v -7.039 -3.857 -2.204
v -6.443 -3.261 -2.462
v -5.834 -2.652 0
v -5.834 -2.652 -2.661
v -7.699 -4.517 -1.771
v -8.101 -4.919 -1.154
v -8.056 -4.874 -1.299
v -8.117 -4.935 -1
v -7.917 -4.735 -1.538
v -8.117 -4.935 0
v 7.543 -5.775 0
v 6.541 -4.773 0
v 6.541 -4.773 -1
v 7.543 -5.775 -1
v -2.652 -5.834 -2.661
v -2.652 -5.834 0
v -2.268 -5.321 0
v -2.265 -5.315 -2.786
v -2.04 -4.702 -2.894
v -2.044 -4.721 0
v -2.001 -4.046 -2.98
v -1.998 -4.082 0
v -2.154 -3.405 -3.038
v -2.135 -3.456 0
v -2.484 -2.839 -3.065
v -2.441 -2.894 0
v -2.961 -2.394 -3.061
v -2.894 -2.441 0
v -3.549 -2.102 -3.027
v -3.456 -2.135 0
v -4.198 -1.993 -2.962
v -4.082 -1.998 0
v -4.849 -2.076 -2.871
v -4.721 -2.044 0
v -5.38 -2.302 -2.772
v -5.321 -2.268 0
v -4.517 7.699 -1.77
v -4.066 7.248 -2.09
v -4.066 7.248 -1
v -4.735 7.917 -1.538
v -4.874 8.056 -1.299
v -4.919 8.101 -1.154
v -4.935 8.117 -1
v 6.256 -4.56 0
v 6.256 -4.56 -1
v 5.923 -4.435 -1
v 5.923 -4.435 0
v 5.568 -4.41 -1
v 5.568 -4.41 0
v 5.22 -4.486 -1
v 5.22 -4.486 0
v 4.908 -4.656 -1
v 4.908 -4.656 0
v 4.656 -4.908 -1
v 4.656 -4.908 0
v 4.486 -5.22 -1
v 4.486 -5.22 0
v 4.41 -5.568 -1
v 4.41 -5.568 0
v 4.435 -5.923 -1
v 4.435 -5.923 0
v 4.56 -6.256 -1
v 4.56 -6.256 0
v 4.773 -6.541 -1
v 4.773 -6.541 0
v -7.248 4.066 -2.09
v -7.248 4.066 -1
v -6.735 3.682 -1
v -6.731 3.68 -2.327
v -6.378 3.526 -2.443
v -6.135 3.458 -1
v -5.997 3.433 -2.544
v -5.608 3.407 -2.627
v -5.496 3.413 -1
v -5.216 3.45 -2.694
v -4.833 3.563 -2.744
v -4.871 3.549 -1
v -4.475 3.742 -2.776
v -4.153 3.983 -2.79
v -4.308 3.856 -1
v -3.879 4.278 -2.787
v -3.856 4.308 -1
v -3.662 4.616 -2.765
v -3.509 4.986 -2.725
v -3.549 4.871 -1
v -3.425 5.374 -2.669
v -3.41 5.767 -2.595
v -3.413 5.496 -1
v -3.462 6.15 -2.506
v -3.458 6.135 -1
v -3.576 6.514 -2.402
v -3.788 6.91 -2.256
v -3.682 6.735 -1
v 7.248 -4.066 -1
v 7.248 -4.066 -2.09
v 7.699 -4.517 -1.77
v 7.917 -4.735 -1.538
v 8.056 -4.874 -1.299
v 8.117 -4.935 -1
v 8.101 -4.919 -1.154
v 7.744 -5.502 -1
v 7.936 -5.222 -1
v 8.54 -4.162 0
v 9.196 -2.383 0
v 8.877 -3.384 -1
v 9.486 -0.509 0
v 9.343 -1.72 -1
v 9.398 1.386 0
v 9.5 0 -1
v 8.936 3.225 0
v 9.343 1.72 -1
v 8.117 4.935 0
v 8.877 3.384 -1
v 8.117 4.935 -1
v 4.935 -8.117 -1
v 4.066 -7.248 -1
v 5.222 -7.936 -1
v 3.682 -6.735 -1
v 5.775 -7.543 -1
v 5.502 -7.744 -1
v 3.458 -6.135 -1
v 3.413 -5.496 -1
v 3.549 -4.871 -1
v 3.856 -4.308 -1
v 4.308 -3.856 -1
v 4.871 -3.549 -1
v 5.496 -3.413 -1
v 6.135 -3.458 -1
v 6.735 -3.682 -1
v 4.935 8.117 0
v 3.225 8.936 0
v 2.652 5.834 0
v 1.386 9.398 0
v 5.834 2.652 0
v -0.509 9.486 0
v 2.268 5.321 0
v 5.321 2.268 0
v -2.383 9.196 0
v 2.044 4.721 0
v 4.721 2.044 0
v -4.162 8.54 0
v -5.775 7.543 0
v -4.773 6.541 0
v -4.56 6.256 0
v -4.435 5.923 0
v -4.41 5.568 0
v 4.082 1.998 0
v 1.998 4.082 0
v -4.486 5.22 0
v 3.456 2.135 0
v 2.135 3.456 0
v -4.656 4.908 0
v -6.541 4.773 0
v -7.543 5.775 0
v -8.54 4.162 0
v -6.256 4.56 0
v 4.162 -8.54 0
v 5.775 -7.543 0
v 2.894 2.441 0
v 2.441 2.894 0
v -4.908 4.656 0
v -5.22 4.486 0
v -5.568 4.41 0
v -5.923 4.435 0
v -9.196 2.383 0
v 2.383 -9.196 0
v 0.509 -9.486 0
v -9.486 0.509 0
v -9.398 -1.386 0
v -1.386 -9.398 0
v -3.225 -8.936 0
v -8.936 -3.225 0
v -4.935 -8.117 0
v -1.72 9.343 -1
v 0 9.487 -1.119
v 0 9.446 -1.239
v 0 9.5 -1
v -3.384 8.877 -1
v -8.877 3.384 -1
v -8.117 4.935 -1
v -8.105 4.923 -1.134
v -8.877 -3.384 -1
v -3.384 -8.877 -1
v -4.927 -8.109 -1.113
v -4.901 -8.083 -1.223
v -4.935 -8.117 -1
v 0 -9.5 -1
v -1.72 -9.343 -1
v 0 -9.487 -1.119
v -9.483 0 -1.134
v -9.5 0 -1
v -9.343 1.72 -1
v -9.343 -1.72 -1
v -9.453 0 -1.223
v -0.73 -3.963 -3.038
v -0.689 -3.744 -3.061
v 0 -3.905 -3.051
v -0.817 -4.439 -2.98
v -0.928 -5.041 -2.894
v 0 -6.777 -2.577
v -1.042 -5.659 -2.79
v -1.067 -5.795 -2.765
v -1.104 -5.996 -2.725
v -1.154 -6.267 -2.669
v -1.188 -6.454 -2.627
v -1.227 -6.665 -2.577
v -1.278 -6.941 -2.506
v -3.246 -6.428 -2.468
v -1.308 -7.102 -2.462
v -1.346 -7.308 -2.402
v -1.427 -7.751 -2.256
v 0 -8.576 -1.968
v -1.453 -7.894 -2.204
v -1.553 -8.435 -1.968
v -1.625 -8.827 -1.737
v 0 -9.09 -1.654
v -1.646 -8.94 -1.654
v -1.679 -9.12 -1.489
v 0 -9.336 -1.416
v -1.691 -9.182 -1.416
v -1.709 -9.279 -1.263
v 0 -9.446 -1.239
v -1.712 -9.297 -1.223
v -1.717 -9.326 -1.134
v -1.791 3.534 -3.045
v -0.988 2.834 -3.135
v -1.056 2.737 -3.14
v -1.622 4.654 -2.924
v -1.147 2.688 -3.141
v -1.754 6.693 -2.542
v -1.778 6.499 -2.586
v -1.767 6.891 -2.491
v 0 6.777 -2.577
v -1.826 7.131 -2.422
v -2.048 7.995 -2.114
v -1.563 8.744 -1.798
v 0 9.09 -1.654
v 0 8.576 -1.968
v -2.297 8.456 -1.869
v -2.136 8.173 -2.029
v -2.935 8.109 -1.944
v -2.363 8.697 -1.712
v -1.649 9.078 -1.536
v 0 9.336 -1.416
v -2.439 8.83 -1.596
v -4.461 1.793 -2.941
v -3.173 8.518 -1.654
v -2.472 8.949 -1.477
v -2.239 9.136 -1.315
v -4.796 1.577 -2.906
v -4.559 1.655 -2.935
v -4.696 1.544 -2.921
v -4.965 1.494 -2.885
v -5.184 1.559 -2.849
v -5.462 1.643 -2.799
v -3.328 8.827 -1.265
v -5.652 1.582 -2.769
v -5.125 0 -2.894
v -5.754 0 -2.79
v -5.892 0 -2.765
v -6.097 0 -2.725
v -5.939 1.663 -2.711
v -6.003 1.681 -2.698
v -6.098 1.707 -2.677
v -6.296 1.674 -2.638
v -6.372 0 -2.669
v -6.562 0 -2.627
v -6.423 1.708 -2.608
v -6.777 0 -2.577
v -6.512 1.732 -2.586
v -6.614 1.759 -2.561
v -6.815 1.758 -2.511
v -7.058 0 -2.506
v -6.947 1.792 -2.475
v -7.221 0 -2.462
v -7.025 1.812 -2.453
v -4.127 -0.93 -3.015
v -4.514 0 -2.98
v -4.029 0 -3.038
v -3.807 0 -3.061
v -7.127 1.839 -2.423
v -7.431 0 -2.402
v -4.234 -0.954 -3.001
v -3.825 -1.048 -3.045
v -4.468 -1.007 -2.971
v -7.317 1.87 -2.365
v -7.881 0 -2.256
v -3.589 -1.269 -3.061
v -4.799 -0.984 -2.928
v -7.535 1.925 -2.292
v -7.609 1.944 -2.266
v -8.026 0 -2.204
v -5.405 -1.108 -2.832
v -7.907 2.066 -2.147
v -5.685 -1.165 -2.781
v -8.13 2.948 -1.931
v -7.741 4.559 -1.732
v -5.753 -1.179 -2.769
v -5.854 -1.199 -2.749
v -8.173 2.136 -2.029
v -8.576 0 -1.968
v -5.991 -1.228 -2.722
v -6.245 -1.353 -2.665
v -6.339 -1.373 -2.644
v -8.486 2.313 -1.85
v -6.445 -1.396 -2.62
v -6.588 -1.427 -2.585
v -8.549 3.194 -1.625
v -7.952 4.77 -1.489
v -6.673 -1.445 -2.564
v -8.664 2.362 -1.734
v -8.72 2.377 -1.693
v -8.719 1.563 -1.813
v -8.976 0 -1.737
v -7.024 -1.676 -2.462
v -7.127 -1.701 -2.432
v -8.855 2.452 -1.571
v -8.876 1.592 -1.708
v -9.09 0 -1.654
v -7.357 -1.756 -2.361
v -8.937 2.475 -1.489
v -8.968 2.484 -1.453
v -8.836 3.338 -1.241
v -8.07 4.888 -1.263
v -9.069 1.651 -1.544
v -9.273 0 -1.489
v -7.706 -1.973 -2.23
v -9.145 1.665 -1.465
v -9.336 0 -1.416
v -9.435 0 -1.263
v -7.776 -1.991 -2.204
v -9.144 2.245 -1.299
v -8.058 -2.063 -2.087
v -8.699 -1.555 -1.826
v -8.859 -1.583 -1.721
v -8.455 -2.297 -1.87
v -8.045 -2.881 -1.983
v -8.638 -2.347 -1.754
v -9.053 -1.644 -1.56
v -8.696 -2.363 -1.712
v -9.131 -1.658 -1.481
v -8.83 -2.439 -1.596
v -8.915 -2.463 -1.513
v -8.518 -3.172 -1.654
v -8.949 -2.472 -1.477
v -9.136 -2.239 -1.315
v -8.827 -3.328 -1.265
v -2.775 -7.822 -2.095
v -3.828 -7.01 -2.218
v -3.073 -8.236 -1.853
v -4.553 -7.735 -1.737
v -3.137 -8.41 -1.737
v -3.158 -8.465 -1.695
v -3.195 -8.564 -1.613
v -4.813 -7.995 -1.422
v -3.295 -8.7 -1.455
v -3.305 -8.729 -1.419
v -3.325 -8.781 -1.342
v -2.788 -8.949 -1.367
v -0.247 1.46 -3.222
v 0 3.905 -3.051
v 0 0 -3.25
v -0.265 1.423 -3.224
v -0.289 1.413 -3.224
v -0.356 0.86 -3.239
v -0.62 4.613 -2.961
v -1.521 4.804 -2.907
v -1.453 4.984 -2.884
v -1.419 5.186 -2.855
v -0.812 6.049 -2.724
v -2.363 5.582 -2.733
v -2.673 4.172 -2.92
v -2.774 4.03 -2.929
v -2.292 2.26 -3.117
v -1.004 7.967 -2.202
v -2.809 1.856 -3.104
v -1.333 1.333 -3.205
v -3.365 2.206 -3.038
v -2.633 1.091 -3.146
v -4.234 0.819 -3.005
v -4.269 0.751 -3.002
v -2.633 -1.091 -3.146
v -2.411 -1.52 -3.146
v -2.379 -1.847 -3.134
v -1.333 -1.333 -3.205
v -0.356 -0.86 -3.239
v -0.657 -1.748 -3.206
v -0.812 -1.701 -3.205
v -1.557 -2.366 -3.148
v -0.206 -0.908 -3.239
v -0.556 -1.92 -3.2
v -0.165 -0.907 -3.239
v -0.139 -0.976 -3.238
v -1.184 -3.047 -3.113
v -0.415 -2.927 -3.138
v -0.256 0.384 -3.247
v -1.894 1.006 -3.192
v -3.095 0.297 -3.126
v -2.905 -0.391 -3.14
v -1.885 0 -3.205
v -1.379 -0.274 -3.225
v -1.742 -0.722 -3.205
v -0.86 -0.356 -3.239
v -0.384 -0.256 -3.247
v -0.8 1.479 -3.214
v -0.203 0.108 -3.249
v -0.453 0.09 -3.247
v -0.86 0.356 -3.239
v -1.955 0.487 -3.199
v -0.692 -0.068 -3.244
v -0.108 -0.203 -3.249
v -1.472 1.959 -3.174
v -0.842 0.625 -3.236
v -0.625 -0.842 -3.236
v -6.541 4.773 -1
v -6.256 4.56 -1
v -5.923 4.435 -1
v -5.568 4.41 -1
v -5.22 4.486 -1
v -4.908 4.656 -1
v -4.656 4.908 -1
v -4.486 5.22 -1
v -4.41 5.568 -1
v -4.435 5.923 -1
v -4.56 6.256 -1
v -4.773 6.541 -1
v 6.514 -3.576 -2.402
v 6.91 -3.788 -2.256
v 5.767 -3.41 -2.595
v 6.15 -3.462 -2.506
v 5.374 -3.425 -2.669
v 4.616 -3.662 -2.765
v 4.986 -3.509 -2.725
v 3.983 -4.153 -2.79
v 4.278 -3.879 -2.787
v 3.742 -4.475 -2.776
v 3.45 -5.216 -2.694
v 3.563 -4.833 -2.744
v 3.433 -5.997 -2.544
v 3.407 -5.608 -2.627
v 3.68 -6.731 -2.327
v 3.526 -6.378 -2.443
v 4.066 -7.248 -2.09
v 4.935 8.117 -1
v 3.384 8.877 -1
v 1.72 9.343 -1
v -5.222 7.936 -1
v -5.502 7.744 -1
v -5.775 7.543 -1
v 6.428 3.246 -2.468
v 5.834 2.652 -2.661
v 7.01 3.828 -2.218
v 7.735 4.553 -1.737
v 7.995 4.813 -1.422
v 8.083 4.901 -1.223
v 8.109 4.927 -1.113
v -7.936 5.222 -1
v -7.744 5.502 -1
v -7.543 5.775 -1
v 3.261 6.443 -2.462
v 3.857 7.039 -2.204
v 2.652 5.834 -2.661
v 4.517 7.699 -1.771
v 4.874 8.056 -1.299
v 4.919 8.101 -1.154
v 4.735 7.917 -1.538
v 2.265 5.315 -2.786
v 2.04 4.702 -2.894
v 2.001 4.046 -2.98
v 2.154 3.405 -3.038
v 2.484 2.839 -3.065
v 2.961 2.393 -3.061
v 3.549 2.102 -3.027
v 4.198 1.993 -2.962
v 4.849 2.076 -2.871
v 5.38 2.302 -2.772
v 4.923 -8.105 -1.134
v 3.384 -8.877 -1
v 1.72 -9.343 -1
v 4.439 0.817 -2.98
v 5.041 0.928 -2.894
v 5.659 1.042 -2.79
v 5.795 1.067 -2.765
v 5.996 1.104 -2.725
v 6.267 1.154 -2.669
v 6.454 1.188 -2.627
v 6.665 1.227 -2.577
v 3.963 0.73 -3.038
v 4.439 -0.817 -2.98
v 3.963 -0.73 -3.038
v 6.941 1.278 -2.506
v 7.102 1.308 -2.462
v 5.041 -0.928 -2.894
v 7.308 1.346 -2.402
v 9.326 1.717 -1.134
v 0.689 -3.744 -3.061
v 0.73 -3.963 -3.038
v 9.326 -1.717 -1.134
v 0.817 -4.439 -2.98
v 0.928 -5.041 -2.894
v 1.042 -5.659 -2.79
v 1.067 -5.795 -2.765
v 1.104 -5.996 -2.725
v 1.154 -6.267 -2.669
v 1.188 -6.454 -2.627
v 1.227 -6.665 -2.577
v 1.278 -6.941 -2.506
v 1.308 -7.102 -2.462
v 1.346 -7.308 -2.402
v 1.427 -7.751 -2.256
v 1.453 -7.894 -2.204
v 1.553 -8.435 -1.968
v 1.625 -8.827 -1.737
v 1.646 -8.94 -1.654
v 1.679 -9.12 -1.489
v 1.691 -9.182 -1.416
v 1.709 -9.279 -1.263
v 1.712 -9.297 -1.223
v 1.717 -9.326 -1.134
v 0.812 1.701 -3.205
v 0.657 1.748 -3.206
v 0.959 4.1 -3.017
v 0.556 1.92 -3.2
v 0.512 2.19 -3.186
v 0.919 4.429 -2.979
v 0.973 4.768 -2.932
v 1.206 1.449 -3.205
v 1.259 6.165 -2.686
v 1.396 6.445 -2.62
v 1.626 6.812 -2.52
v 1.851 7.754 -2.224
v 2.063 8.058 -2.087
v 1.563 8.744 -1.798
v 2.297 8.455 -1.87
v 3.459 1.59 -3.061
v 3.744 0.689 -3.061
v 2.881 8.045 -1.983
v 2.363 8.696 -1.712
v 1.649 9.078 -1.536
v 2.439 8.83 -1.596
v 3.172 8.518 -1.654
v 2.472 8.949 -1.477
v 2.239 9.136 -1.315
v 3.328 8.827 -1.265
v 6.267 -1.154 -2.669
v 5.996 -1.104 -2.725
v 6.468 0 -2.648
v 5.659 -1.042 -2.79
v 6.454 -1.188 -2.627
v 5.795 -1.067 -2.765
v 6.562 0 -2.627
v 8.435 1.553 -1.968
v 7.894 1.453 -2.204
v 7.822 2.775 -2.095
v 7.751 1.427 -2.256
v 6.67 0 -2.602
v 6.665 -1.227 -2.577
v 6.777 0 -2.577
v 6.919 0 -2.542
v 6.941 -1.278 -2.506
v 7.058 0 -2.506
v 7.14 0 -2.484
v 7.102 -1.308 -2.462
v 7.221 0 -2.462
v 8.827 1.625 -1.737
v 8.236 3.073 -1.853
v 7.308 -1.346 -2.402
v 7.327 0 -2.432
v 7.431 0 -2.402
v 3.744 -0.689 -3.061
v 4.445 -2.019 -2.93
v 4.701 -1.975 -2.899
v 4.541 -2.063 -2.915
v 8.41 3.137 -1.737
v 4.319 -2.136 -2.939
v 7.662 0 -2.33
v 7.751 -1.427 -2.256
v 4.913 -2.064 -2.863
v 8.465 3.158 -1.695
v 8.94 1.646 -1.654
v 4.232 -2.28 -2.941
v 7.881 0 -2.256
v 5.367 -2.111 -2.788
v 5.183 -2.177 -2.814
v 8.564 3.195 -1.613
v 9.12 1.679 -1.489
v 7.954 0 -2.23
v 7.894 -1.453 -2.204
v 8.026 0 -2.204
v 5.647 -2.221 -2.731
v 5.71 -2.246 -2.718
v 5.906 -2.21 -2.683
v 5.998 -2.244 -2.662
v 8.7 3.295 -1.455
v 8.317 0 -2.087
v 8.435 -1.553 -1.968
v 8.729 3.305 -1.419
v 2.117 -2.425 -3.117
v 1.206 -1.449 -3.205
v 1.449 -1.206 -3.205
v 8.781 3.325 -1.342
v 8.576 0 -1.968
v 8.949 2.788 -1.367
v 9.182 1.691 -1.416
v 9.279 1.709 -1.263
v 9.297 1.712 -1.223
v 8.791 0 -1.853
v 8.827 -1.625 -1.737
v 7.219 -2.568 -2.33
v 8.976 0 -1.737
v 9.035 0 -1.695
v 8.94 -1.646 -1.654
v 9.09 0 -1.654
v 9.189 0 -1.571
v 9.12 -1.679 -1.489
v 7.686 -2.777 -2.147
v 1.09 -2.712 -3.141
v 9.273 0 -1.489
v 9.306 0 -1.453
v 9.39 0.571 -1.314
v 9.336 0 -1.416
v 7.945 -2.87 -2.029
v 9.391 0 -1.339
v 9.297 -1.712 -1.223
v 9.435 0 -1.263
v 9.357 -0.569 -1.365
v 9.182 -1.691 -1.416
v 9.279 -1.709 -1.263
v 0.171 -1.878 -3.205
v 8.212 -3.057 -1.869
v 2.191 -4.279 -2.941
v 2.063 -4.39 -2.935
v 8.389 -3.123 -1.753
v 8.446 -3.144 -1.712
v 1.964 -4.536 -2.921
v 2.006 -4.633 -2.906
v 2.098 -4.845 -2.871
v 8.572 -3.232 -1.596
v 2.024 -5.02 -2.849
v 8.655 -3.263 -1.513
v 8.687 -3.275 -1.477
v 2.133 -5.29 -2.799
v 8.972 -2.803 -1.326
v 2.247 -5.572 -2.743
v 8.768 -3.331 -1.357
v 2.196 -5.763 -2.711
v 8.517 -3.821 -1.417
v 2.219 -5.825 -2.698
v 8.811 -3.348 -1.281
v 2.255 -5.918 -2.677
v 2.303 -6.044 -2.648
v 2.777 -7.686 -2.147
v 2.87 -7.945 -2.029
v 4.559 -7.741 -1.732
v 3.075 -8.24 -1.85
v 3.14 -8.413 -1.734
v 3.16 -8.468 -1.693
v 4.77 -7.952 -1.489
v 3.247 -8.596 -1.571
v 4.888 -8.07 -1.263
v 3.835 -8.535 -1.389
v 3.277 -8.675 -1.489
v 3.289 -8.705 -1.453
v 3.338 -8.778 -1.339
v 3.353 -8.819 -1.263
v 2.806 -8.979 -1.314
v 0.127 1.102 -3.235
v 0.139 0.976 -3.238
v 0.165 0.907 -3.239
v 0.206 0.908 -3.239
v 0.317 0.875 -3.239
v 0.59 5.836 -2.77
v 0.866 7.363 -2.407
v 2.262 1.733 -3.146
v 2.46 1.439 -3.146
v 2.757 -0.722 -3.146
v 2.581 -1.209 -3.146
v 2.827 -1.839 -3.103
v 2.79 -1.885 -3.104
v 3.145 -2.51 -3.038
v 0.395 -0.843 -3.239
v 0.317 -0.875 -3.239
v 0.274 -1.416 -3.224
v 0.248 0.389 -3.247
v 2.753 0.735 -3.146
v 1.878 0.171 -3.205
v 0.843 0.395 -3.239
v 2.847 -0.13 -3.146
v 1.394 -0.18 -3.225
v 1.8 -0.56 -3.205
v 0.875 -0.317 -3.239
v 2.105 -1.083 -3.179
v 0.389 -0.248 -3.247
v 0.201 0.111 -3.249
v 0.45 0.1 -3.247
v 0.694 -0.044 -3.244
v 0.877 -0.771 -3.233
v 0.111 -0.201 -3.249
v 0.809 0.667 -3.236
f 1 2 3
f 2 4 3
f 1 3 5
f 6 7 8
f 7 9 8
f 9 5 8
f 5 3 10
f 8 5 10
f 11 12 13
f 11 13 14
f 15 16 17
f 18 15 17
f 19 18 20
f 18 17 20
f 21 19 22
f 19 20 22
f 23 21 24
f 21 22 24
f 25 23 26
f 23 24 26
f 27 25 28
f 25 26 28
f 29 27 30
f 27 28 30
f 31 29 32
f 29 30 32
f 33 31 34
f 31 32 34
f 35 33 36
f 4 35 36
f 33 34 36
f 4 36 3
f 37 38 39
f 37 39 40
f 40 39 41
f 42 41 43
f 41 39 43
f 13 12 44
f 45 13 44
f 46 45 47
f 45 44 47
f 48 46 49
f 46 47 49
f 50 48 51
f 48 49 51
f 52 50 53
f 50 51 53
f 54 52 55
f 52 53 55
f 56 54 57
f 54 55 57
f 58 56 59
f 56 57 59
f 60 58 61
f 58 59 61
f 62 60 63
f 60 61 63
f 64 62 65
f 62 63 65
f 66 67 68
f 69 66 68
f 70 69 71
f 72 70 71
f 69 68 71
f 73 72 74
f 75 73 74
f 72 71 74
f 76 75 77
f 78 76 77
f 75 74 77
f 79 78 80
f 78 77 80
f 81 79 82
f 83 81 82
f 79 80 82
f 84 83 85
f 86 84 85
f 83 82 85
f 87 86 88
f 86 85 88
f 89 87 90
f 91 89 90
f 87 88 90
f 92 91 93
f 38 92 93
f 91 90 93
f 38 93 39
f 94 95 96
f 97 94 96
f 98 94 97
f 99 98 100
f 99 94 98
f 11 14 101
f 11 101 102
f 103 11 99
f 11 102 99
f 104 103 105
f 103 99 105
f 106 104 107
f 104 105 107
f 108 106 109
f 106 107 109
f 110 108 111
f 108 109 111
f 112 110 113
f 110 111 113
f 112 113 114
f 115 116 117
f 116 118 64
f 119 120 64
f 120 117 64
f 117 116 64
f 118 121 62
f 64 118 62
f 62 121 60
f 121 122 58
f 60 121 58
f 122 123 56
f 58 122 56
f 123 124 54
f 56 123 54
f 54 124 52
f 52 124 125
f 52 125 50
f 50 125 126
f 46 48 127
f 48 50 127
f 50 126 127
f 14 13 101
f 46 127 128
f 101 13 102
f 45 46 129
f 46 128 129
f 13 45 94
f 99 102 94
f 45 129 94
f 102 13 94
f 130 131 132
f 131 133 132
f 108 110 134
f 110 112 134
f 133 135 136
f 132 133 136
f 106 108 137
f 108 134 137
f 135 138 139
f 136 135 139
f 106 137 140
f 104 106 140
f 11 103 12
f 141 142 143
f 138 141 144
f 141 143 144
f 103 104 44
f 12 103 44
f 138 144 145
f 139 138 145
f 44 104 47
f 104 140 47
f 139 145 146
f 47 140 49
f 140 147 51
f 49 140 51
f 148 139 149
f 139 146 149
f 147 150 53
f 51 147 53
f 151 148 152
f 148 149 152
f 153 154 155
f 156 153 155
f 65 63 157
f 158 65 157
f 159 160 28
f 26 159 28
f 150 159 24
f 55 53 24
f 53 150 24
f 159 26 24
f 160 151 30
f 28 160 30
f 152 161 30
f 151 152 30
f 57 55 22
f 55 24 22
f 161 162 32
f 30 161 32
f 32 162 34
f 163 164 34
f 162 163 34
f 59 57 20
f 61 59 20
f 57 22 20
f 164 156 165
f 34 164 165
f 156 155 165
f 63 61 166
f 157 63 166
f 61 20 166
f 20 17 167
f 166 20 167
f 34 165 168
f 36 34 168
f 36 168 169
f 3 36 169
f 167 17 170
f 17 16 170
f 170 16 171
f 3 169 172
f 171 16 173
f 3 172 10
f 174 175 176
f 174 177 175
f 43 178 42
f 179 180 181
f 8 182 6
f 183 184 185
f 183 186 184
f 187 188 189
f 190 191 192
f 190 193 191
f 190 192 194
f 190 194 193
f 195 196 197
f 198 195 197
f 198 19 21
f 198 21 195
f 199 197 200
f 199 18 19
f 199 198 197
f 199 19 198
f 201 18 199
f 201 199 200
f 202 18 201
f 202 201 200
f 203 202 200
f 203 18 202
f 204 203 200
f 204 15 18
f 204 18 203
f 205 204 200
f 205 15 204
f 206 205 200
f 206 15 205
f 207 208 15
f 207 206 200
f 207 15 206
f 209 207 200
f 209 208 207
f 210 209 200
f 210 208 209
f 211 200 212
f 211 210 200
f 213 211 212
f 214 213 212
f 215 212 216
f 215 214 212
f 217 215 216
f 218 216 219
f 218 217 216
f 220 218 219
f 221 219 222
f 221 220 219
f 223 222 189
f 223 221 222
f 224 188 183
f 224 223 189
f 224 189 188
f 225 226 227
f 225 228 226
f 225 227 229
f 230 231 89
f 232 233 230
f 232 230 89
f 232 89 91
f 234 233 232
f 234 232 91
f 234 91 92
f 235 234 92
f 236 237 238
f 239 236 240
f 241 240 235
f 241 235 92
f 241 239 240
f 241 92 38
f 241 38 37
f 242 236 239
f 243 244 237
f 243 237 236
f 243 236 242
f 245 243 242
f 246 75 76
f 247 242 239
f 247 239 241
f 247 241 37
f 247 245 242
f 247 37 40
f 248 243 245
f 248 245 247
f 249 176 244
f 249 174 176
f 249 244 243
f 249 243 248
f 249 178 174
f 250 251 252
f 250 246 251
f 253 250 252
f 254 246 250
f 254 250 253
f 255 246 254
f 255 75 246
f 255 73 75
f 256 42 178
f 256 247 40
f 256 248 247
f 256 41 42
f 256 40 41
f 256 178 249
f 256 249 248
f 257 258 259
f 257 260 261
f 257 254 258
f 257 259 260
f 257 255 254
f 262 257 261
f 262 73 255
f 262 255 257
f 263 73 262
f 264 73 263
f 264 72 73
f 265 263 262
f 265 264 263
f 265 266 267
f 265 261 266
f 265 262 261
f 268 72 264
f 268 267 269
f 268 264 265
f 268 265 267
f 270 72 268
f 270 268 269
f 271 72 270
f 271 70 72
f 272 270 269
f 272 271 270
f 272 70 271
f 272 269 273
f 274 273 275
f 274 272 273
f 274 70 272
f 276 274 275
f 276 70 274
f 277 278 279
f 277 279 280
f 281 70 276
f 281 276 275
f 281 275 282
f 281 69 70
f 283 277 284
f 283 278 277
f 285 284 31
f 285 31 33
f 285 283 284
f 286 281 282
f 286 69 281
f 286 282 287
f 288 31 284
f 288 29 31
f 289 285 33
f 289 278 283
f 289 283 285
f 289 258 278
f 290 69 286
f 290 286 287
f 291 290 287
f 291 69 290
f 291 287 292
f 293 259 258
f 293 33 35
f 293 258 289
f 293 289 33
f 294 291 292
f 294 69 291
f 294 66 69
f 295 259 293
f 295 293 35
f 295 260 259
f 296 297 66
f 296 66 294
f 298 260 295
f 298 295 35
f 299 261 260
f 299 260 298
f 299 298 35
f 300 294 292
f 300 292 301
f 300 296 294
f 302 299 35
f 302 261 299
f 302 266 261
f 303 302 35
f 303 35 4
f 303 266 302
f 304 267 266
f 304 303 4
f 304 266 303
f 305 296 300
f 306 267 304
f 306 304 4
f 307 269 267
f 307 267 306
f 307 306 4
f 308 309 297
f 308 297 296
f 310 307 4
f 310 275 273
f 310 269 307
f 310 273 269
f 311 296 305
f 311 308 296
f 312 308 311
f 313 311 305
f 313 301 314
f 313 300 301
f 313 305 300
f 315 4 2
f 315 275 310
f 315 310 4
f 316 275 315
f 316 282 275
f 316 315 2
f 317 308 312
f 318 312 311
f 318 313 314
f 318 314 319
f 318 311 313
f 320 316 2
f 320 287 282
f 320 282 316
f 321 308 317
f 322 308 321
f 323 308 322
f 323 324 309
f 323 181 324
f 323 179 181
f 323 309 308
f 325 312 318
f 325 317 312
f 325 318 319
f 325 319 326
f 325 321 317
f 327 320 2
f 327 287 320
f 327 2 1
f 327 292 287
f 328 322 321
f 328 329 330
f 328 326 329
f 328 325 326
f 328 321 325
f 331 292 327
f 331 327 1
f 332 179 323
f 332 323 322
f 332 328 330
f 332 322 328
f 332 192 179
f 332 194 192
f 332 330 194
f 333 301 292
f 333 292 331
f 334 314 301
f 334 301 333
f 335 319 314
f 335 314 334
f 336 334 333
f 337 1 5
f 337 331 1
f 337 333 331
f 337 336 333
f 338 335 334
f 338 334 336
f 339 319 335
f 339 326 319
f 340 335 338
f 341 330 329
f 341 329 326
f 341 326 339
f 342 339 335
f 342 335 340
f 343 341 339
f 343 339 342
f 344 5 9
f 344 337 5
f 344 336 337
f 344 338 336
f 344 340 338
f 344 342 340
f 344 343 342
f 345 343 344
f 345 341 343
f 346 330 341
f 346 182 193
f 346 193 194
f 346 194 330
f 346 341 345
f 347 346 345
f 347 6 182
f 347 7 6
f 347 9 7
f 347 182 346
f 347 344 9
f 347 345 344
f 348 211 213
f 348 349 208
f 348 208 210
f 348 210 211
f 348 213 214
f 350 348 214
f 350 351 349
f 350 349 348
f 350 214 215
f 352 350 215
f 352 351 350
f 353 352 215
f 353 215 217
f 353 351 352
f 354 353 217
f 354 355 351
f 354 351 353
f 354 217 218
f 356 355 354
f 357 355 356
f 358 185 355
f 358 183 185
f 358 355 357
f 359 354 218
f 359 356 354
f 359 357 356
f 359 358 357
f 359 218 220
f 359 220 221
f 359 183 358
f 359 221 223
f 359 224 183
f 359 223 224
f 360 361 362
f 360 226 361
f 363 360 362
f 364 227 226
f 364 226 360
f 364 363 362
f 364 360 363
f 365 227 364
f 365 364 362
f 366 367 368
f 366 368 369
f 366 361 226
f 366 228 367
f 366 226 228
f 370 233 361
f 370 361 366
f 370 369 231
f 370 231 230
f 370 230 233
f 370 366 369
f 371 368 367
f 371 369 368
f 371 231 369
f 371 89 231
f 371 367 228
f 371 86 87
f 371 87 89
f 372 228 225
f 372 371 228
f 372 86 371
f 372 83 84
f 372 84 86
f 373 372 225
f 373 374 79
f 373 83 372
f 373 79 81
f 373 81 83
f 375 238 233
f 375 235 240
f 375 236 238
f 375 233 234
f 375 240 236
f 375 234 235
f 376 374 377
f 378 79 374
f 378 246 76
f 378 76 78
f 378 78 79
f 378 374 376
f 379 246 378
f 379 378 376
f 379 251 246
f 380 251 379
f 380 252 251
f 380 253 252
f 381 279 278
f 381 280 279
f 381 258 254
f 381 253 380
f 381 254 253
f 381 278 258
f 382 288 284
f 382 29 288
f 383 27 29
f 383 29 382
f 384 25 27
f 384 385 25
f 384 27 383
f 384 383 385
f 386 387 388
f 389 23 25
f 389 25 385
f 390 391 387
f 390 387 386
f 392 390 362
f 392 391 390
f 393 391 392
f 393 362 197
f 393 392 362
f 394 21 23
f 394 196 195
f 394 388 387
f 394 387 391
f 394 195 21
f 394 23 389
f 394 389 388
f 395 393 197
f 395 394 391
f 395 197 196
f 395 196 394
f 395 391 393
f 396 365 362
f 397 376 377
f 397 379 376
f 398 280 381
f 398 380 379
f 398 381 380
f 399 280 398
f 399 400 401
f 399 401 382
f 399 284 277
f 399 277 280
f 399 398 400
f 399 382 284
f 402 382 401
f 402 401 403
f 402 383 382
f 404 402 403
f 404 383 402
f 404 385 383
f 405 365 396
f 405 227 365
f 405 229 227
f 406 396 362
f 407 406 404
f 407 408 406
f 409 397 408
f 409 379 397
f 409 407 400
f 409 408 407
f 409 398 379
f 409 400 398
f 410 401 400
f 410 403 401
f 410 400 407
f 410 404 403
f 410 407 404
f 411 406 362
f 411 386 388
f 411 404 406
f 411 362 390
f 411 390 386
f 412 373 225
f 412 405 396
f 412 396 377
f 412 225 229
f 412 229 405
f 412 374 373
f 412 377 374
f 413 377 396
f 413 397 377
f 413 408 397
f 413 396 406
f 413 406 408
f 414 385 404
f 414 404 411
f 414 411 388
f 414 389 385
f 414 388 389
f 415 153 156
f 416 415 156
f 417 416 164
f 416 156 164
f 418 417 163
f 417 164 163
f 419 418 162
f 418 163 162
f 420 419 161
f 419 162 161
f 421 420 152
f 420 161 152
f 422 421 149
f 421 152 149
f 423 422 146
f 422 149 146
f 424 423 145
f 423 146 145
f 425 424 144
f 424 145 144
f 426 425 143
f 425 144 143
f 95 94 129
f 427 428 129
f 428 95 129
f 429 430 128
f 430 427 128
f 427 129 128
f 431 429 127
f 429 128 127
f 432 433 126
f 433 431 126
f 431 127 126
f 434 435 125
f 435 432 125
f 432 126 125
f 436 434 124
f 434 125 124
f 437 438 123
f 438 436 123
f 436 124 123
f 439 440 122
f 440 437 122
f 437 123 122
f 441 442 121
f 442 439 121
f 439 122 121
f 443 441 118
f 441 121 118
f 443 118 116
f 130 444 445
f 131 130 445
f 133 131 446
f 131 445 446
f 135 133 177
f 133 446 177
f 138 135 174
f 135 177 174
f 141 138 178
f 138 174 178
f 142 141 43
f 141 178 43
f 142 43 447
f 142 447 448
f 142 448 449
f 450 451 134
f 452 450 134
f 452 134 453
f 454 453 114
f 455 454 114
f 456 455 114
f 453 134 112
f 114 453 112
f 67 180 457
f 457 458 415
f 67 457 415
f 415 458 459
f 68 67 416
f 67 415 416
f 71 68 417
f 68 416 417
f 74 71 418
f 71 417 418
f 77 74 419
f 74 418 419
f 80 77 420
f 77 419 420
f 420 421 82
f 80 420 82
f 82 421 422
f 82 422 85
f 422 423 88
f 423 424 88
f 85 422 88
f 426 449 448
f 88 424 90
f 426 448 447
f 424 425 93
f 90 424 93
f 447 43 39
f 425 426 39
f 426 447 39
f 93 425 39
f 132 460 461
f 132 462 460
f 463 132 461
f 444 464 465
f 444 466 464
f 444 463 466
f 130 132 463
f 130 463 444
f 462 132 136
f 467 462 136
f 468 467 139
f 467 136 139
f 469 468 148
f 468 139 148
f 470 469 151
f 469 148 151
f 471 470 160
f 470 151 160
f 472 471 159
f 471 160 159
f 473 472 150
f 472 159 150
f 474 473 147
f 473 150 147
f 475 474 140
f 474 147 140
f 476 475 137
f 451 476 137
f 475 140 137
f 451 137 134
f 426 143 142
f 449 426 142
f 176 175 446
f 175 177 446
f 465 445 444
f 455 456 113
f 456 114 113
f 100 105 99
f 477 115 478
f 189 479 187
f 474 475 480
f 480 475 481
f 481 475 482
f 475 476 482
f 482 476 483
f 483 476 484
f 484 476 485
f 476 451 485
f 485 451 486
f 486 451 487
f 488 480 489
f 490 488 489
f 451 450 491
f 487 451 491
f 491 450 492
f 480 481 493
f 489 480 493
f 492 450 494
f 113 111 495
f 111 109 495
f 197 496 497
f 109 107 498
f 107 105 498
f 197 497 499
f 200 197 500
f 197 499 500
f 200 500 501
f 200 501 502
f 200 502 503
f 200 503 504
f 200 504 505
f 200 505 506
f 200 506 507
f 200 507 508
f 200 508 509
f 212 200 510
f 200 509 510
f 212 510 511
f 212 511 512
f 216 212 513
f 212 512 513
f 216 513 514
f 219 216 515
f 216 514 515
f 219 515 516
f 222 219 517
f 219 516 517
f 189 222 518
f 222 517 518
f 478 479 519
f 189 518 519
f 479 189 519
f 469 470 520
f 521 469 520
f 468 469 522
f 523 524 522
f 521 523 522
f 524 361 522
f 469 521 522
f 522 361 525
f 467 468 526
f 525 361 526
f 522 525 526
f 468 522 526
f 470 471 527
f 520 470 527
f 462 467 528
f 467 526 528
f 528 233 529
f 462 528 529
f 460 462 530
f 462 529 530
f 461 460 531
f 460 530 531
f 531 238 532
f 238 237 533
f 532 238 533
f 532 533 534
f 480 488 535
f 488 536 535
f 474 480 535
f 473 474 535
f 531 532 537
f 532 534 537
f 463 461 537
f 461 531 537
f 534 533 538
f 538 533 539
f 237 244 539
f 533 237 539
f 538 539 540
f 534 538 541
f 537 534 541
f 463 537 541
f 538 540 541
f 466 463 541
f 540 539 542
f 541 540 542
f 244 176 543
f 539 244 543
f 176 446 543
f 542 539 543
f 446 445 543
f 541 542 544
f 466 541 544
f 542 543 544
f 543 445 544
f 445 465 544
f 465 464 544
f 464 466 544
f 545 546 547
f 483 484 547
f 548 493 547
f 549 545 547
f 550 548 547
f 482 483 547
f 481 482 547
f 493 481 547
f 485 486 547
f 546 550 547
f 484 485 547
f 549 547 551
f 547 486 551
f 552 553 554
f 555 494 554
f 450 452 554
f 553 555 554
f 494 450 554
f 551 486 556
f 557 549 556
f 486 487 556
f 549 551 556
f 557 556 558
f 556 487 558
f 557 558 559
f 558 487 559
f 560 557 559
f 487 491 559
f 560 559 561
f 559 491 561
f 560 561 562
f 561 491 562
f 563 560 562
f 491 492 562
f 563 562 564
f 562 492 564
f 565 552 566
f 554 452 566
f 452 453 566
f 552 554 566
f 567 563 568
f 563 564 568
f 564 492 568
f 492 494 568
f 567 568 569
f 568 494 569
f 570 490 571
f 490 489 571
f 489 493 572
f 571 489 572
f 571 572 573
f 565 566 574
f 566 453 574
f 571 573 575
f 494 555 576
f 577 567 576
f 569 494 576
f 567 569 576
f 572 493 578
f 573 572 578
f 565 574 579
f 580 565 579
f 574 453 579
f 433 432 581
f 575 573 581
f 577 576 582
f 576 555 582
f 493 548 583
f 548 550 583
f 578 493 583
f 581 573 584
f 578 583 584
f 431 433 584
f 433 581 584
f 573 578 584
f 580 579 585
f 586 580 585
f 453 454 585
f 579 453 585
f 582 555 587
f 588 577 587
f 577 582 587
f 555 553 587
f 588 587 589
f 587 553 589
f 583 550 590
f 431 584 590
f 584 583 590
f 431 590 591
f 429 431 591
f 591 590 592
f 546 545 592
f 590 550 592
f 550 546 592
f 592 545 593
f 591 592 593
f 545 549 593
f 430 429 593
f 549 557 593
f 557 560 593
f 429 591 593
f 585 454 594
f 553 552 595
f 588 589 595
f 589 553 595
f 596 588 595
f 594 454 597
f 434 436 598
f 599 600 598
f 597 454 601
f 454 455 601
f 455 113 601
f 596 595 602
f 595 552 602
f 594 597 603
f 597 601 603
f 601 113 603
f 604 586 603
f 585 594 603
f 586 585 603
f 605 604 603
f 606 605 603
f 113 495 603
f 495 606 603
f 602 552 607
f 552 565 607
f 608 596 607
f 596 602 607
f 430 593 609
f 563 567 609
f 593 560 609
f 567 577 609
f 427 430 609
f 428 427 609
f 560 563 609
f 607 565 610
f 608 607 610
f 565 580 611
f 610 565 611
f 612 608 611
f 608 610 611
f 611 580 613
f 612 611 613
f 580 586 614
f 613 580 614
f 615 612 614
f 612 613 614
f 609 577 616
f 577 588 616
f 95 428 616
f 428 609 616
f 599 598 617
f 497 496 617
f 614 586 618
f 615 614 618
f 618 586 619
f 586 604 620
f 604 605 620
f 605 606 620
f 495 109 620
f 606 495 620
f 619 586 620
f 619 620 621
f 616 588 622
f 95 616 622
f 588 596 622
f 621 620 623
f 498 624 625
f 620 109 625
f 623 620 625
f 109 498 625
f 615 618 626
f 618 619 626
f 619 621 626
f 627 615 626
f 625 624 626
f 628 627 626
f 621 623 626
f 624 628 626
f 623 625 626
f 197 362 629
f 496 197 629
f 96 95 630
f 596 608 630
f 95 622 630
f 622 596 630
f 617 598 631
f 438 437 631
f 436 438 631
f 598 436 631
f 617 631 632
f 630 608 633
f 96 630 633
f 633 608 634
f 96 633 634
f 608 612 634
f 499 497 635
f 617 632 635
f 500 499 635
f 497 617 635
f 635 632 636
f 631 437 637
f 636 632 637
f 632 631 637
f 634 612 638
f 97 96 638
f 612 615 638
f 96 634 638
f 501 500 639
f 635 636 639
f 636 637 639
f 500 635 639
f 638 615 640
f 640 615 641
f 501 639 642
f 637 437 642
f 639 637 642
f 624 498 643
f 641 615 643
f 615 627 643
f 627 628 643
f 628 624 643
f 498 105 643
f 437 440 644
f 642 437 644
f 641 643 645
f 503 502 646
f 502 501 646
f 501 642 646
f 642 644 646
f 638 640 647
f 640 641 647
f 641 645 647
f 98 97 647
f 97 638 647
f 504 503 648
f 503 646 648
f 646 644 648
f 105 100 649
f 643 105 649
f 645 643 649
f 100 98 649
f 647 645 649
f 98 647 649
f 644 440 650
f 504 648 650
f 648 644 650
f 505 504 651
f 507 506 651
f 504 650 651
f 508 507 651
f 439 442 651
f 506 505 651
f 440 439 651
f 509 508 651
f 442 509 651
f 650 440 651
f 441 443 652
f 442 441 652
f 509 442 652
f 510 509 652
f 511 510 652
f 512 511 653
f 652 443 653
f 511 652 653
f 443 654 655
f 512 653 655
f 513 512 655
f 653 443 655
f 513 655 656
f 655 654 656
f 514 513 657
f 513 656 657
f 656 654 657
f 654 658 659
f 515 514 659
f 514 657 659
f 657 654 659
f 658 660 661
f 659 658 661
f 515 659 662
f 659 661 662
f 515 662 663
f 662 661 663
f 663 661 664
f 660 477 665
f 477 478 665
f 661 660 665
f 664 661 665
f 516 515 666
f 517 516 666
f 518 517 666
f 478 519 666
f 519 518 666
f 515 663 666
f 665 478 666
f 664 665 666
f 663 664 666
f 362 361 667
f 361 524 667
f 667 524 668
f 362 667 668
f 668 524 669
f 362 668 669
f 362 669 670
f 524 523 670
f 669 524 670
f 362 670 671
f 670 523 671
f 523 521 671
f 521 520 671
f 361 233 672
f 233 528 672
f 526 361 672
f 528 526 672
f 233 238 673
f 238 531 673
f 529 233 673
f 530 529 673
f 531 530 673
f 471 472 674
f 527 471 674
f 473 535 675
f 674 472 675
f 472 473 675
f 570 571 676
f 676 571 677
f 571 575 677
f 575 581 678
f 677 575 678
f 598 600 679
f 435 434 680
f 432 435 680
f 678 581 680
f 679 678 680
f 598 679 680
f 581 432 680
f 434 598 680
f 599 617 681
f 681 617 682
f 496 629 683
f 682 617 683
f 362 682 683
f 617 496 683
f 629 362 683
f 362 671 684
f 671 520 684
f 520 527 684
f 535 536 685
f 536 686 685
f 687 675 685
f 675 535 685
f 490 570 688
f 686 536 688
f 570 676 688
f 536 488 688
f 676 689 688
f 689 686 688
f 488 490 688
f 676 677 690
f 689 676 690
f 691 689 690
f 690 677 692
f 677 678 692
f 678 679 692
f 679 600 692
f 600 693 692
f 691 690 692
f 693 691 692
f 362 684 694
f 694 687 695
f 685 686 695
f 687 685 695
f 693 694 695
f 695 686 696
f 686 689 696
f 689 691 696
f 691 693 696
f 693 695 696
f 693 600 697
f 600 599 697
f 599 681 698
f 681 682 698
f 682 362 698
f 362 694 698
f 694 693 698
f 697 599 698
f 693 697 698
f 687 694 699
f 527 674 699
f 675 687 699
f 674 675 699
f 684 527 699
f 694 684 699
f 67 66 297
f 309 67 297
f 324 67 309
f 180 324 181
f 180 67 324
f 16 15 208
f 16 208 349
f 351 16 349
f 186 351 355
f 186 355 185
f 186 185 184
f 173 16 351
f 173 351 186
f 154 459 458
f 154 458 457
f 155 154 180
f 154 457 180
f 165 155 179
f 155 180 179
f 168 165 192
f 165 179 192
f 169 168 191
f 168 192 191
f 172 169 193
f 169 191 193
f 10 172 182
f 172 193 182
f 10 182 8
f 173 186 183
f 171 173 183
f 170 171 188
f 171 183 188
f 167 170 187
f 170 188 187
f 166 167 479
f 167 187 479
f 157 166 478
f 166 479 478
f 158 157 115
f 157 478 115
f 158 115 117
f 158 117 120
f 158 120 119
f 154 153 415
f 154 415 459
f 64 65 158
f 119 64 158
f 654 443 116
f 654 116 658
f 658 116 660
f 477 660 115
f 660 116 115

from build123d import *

# Parameters (mm, degrees)
SKETCH026_R         = 20
PAD026_DEPTH        = 9
SKETCH025_R         = 20
PAD025_DEPTH        = 1
REVOLUTION001_ANGLE = -360


with BuildPart() as screwshouldercutout:
    # Sketch026 → Pad026 (new body)
    with BuildSketch(Plane.XY):
        Circle(SKETCH026_R)
        with BuildLine():
            ThreePointArc((-2.65165, -5.833631), (-2.65165, -2.65165), (-5.833631, -2.65165))
            Line((-5.833631, -2.65165), (-12.077589, -8.895608))
            ThreePointArc((-12.077589, 8.895608), (-15, 0), (-12.077589, -8.895608))
            Line((-7.247845, 4.065864), (-12.077589, 8.895608))
            ThreePointArc((-7.247845, 4.065864), (-4.065864, 4.065864), (-4.065864, 7.247845))
            Line((-4.065864, 7.247845), (-8.895608, 12.077589))
            ThreePointArc((8.895608, 12.077589), (0, 15), (-8.895608, 12.077589))
            Line((2.65165, 5.833631), (8.895608, 12.077589))
            ThreePointArc((2.65165, 5.833631), (2.65165, 2.65165), (5.833631, 2.65165))
            Line((5.833631, 2.65165), (12.077589, 8.895608))
            ThreePointArc((12.077589, -8.895608), (15, 0), (12.077589, 8.895608))
            Line((7.247845, -4.065864), (12.077589, -8.895608))
            ThreePointArc((7.247845, -4.065864), (4.065864, -4.065864), (4.065864, -7.247845))
            Line((4.065864, -7.247845), (8.895608, -12.077589))
            ThreePointArc((-8.895608, -12.077589), (0, -15), (8.895608, -12.077589))
            Line((-2.65165, -5.833631), (-8.895608, -12.077589))
        make_face(mode=Mode.SUBTRACT)
    extrude(amount=-PAD026_DEPTH)


with BuildPart() as screwshouldercutout_1:
    # Body027 placement: moved
    add(screwshouldercutout.part.moved(Location((0, 0, -1))))


with BuildPart() as screwmountcutout:
    # Sketch025 → Pad025 (new body)
    with BuildSketch(Plane.XY):
        Circle(SKETCH025_R)
        with BuildLine():
            ThreePointArc((-2.65165, -5.833631), (-2.65165, -2.65165), (-5.833631, -2.65165))
            Line((-5.833631, -2.65165), (-12.077589, -8.895608))
            ThreePointArc((-11.453593, 9.685826), (-14.991549, 0.503442), (-12.077589, -8.895608))
            Line((-6.540738, 4.772971), (-11.453593, 9.685826))
            ThreePointArc((-6.540738, 4.772971), (-4.772971, 4.772971), (-4.772971, 6.540738))
            Line((-4.772971, 6.540738), (-9.685826, 11.453593))
            ThreePointArc((8.895608, 12.077589), (-0.503442, 14.991549), (-9.685826, 11.453593))
            Line((2.65165, 5.833631), (8.895608, 12.077589))
            ThreePointArc((2.65165, 5.833631), (2.65165, 2.65165), (5.833631, 2.65165))
            Line((5.833631, 2.65165), (12.077589, 8.895608))
            ThreePointArc((11.453593, -9.685826), (14.991549, -0.503442), (12.077589, 8.895608))
            Line((6.540738, -4.772971), (11.453593, -9.685826))
            ThreePointArc((6.540738, -4.772971), (4.772971, -4.772971), (4.772971, -6.540738))
            Line((4.772971, -6.540738), (9.685826, -11.453593))
            ThreePointArc((-8.895608, -12.077589), (0.503442, -14.991549), (9.685826, -11.453593))
            Line((-2.65165, -5.833631), (-8.895608, -12.077589))
        make_face(mode=Mode.SUBTRACT)
    extrude(amount=-PAD025_DEPTH)


with BuildPart() as cone001:
    # Sketch027 → Revolution001 (revolve, symmetric)
    with BuildSketch(Plane.YZ) as revolution001_sk:
        with BuildLine():
            Line((0, 0), (9.5, 0))
            Line((9.5, 0), (9.5, -1))
            add(Edge.make_bspline(
                [(0, -3.25), (9.5, -3.25), (9.5, -1)],
                knots=[4.712389, 4.712389, 4.712389, 6.283185, 6.283185, 6.283185], degree=2, weights=[1, 0.707107, 1]))
            Line((0, -3.25), (0, 0))
        make_face()
    revolve(axis=Axis((0, 0, 0), (0, 0, 1)), revolution_arc=REVOLUTION001_ANGLE / 2)
    revolve(revolution001_sk.sketch, axis=Axis((0, 0, 0), (0, 0, -1)), revolution_arc=REVOLUTION001_ANGLE / 2)

    # Boolean005: cut ScrewShoulderCutout, ScrewMountCutout
    add(screwshouldercutout_1.part, mode=Mode.SUBTRACT)
    add(screwmountcutout.part, mode=Mode.SUBTRACT)


solid = cone001.part
